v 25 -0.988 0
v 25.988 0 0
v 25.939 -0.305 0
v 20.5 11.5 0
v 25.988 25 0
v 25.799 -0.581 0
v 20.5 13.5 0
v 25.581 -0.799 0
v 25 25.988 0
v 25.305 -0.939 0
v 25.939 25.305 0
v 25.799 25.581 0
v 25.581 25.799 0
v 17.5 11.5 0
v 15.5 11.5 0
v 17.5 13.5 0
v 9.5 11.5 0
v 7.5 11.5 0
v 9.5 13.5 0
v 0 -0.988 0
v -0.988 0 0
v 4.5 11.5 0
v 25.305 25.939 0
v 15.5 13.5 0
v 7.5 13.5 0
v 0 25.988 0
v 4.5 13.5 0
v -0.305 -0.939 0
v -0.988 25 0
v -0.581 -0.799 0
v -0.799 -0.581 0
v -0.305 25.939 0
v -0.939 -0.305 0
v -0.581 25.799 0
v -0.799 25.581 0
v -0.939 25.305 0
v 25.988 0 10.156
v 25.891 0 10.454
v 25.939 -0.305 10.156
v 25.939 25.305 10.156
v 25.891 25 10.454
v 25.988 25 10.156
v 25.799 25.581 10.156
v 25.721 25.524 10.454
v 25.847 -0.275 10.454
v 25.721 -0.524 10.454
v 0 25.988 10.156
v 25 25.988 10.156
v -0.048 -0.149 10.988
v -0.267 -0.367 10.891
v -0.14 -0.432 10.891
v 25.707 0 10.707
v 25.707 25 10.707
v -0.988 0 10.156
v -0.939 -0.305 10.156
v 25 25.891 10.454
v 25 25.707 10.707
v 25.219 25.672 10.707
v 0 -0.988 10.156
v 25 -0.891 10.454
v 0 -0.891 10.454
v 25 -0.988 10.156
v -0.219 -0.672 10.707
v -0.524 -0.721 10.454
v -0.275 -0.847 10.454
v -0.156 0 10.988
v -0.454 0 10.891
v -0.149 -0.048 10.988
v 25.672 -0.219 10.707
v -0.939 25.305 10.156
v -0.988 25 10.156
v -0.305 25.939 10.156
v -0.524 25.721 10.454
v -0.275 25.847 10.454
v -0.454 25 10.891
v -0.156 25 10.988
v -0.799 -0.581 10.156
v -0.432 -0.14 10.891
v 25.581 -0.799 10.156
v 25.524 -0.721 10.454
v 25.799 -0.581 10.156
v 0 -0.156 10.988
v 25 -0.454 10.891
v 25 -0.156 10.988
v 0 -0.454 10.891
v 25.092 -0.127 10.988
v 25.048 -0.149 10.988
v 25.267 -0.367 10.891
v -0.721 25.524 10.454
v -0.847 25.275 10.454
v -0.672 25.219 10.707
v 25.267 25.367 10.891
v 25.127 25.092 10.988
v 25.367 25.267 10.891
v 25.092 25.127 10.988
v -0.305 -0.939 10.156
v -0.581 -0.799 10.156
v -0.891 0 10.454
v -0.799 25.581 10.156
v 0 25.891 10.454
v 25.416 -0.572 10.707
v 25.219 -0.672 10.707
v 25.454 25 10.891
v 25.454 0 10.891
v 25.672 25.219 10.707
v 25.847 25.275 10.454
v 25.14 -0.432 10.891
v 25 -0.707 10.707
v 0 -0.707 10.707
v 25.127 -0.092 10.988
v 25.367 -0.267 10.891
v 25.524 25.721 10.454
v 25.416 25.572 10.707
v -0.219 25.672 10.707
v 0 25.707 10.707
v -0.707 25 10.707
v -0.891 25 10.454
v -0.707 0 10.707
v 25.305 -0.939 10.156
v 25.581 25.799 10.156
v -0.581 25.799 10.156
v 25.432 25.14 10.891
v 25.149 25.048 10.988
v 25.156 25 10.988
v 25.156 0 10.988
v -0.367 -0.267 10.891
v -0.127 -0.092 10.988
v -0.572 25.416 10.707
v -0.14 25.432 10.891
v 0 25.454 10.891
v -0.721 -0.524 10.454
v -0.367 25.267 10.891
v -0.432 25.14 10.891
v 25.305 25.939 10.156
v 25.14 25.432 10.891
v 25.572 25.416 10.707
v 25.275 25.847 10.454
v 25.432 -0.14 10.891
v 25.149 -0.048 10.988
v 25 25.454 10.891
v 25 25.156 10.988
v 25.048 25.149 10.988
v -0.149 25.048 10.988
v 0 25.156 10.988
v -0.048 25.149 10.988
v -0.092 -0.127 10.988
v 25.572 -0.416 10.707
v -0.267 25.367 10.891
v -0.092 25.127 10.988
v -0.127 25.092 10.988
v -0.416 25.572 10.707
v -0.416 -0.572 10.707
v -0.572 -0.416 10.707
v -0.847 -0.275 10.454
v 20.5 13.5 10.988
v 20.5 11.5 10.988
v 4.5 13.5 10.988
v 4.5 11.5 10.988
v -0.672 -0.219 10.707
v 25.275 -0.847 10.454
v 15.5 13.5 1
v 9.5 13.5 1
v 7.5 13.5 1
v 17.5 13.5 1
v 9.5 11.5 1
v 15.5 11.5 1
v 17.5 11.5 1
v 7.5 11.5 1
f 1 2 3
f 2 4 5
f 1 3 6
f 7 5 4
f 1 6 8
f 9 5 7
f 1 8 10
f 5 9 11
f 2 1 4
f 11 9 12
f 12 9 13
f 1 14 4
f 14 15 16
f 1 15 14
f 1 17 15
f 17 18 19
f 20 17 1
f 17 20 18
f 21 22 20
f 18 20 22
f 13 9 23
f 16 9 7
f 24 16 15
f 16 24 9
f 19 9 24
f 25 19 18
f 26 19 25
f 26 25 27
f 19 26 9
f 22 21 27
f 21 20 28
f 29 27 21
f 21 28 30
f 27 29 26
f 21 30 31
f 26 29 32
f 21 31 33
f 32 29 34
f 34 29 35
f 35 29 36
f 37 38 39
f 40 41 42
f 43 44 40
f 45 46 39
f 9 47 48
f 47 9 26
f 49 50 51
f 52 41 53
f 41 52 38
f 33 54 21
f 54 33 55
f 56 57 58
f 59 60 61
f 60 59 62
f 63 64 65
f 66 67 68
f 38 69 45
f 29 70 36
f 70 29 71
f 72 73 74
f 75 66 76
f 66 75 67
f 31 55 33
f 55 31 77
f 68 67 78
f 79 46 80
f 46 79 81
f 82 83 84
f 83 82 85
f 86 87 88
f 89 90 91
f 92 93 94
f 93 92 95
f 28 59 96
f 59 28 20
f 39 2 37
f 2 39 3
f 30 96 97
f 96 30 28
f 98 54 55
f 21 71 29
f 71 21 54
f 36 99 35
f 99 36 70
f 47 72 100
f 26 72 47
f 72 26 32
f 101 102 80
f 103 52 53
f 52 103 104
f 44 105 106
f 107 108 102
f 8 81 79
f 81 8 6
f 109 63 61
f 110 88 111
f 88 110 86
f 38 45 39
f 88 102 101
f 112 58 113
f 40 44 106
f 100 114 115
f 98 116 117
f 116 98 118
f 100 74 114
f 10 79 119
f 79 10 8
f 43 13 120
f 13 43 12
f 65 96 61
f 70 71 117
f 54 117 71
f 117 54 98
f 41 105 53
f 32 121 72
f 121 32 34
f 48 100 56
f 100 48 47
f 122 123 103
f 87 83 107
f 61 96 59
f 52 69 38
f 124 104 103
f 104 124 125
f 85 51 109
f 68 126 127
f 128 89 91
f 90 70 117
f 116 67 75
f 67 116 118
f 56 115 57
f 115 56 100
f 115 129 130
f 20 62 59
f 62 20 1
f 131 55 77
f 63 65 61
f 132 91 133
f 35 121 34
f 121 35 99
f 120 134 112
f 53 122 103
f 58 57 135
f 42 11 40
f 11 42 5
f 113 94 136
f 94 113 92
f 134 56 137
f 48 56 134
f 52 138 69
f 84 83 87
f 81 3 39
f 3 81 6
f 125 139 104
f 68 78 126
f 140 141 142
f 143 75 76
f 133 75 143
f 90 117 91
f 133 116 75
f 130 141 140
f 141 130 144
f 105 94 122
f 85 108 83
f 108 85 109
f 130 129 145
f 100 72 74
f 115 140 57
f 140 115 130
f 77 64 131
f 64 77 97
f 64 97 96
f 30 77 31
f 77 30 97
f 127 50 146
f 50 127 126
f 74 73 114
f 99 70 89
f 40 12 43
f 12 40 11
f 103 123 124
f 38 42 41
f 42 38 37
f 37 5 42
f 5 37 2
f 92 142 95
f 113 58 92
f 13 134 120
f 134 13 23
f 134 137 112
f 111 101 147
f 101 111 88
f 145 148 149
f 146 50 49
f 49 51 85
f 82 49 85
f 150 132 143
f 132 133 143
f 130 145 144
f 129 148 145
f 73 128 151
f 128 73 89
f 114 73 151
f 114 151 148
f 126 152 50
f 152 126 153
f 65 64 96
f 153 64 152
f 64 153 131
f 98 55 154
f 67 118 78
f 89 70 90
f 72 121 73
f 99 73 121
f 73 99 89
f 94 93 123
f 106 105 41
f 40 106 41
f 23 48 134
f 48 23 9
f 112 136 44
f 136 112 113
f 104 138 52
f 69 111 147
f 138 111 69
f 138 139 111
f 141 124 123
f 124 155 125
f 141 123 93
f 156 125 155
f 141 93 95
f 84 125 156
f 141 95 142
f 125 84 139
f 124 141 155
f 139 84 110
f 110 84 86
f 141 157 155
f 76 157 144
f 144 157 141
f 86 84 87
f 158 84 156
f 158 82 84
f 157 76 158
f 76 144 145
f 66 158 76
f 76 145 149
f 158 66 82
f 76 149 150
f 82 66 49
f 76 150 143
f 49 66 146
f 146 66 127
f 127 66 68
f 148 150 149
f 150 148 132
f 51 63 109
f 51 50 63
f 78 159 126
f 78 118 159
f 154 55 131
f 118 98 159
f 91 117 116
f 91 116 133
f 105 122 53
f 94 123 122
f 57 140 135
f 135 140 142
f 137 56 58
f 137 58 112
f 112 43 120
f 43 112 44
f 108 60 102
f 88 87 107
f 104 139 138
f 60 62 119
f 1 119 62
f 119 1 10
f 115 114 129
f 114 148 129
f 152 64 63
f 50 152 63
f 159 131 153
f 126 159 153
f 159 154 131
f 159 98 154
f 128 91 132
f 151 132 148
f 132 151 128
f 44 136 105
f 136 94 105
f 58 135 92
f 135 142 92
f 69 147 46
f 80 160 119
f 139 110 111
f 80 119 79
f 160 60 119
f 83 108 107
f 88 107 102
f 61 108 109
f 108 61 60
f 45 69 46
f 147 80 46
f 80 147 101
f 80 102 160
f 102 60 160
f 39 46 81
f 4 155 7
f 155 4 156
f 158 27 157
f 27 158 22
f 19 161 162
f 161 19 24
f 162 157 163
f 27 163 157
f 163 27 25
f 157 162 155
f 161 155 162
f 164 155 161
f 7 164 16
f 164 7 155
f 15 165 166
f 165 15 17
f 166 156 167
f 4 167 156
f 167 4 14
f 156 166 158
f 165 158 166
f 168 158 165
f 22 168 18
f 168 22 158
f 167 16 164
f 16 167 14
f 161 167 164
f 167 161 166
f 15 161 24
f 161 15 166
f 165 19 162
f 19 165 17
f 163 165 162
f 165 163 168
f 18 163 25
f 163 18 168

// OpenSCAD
// file: common.scad
slot_width=16;
slot_depth=2;
outer_wall=1;
base_height=13;

webbing_cover=40;
webbing_width=0.1;
webbing_dist=2;

module webbing_base() {
     for (i = [0 : webbing_dist : webbing_cover]) {
          translate([i - webbing_width/2, 0, 0]) {
               cube([webbing_width, webbing_cover, base_height]);
          }
          translate([0, i - webbing_width/2, 0]) {
               cube([webbing_cover, webbing_width, base_height]);
          }
     }
}

module webbing() {
     rotate([0, 0, 45]) {
          translate([-webbing_cover/2, -webbing_cover/2, 0]) {
               webbing_base();
          }
     }
}

module slot() {
     translate([0, 0, base_height/2]) {
          cube([slot_width, slot_depth,
                base_height*2], center=true);
     }
}

module slot_wall() {
     translate([0, 0, outer_wall*5]) {
          cube([slot_width+(outer_wall*2), slot_depth+(outer_wall*2),
                base_height+(outer_wall*3)], center=true);
     }
}

module slot_midwall() {
     translate([0, 0, outer_wall*2]) {
          cube([slot_width+outer_wall, slot_depth+outer_wall,
                base_height+outer_wall], center=true);
     }
}

module slot_base() {
     for (t = [slot_width/4, -slot_width/4]) {
          translate([t, 0, outer_wall/2]) {
               cube([slot_depth, slot_depth, outer_wall], center=true);
          }
     }
}
// main file
// PCB width: 15mm
// PCB slot height: 12mm
// PCB thickness: 1.6mm

include <common.scad>;
box_width=25;
box_depth=25;
box_height=10;

module base_hull() {
     cube(size=[box_width, box_depth, box_height]);
}

module hull() {
     minkowski() {
          base_hull();
          intersection() {
               sphere(r=outer_wall, $fn=20);
               translate([-outer_wall, -outer_wall, 0]) {
                    cube([outer_wall*2, outer_wall*2, outer_wall]);
               }
          }
     }
}

module main() {
     difference() {
          union() {
               hull();
               intersection() {
                    translate([box_width/2, box_depth/2, 0]) slot_wall();
                    base_hull();
               }
          }
          translate([box_width/2, box_depth/2, 0]) slot();
     }
     translate([box_width/2, box_depth/2, 0]) slot_base();
}
main();
